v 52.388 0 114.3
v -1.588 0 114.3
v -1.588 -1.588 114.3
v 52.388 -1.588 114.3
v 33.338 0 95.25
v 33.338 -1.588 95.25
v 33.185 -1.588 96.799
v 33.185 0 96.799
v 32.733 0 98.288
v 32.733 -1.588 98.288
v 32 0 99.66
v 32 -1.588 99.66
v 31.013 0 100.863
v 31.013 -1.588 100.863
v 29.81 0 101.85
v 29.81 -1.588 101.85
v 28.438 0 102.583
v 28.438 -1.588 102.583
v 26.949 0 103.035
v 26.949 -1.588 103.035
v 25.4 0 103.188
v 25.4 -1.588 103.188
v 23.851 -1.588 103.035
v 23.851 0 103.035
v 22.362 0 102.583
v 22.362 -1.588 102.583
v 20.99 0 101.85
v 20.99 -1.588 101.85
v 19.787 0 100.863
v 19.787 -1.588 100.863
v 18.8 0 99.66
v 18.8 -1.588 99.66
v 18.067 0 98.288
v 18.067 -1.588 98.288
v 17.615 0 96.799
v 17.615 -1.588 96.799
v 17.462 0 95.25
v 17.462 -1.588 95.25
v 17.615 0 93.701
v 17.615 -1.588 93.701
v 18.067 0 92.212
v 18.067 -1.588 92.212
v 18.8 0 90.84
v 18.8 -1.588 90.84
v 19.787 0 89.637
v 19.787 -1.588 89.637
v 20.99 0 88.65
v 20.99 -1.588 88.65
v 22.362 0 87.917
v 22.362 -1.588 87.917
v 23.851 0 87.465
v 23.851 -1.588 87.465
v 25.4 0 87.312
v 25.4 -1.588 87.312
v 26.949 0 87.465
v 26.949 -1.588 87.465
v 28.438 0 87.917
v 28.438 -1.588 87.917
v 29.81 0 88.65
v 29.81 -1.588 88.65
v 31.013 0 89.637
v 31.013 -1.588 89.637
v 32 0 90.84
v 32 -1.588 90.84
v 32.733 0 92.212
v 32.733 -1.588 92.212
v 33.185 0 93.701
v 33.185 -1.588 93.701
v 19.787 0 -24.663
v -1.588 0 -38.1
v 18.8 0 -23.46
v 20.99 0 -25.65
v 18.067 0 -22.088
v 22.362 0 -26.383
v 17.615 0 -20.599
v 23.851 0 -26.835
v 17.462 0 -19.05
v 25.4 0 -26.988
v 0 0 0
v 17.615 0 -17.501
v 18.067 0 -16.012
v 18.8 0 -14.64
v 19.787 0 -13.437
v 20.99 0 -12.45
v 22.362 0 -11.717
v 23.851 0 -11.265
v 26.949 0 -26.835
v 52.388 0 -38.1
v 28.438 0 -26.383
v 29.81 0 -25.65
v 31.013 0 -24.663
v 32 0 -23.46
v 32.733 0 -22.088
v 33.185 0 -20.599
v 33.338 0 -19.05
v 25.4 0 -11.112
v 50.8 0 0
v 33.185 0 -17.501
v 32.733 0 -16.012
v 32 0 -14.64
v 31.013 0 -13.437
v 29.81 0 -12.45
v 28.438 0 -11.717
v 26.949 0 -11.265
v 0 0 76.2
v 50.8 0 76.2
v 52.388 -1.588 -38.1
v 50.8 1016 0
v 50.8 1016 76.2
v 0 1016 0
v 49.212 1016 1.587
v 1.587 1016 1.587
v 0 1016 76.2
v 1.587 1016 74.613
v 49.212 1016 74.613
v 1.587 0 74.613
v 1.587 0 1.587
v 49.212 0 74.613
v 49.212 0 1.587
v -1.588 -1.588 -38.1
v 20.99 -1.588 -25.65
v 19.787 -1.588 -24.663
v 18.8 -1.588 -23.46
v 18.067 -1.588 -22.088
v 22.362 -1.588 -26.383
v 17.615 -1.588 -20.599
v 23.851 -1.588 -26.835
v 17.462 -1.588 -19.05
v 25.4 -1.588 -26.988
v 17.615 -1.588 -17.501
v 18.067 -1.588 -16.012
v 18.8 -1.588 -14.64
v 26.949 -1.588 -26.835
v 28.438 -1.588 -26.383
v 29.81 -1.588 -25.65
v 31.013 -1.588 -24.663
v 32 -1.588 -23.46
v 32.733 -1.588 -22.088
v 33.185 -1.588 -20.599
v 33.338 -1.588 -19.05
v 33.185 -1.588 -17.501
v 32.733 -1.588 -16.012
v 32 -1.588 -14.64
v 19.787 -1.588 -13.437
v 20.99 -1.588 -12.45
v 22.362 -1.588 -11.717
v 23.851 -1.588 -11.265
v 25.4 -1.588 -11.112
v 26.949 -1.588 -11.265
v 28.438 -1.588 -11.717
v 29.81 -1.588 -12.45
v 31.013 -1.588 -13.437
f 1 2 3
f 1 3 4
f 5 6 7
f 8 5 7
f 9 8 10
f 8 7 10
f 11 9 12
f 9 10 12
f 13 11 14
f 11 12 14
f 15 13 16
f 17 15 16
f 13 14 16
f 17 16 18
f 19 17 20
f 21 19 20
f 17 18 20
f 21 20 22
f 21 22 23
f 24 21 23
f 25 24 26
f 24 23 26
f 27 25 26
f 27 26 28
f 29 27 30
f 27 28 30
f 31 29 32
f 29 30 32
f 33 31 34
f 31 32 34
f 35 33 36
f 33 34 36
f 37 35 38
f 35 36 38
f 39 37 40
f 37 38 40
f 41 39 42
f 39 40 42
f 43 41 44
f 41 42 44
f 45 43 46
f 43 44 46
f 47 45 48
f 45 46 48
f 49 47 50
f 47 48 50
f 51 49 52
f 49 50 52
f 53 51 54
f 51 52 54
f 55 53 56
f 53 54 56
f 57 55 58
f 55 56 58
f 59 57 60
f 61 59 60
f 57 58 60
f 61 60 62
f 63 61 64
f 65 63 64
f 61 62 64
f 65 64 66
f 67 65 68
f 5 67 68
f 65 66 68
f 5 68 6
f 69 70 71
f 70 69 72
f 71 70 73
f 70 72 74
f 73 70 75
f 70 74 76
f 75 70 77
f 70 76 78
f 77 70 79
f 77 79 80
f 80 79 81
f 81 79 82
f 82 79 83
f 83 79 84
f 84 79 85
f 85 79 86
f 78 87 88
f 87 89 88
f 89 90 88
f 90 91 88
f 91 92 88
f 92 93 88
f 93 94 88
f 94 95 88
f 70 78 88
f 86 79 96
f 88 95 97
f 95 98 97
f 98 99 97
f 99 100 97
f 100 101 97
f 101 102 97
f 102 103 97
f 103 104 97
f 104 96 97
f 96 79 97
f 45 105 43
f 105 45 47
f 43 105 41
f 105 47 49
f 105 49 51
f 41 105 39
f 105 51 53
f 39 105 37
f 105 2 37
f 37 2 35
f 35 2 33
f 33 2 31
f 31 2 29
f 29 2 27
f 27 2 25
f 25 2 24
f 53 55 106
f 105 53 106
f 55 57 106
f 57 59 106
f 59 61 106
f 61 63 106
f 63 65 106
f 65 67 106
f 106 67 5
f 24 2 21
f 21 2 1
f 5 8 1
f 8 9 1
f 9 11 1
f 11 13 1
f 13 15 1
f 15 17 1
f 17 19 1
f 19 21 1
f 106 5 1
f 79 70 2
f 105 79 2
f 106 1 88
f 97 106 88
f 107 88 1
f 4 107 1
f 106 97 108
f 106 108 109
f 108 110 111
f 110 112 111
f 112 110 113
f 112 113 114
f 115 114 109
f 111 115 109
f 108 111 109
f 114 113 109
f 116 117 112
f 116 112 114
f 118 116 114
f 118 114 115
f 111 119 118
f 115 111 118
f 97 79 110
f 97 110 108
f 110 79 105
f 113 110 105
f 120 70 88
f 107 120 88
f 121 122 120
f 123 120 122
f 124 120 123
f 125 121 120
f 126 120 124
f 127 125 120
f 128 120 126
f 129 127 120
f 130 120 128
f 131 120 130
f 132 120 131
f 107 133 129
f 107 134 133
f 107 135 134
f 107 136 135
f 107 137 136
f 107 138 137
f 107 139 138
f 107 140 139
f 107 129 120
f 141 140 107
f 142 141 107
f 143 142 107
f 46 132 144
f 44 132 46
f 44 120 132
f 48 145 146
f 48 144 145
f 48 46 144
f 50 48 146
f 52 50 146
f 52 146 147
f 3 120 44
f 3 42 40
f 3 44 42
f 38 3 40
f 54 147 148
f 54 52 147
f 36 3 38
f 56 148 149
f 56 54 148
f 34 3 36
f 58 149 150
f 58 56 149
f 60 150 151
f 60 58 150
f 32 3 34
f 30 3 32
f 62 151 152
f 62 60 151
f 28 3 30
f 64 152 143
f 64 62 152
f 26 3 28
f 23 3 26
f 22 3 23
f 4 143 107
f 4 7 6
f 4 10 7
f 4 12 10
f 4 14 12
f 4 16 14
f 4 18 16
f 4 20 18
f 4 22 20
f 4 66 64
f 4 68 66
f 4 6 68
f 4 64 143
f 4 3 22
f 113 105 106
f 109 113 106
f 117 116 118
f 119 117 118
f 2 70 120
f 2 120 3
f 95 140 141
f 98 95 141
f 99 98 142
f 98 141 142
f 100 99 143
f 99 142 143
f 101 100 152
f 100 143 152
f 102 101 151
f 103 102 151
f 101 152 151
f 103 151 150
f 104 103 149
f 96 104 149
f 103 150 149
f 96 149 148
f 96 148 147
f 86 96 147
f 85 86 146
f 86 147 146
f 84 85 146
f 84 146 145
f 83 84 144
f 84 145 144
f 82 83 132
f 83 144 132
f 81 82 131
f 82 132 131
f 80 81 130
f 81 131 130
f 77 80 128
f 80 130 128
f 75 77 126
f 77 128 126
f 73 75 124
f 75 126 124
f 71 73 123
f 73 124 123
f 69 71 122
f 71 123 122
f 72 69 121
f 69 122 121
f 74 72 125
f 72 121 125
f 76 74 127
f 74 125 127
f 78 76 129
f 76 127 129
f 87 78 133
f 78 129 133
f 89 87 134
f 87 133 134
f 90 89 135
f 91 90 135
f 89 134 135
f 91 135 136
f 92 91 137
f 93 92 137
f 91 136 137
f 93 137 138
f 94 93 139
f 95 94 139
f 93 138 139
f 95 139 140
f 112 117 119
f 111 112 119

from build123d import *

# Parameters (mm, degrees)
F0_W     = 50.8
F0_H     = 76.2
F0_W_2   = 47.625
F0_H_2   = 73.025
F1_DEPTH = 1016
F2_W     = 53.975
F2_H     = 152.4
F3_DEPTH = 1.5875
F4_R     = 7.9375
F5_DEPTH = 1.5875


with BuildPart() as f1:
    # F0 (on Front) → F1 (new body)
    with BuildSketch(Plane.XZ):
        with Locations((25.4, 38.1)):
            Rectangle(F0_W, F0_H)
        with Locations((25.4, 38.1)):
            Rectangle(F0_W_2, F0_H_2, mode=Mode.SUBTRACT)
    extrude(amount=-F1_DEPTH)

    # F2 (on face) → F3 (join)
    with BuildSketch(Plane.XZ):
        with Locations((25.4, 38.1)):
            Rectangle(F2_W, F2_H)
    extrude(amount=F3_DEPTH)

    # F4 (on face) → F5 (cut, through all)
    with BuildSketch(Plane.XZ.offset(1.5875)):
        with Locations((25.4, 95.25)):
            Circle(F4_R)
        with Locations((25.4, -19.05)):
            Circle(F4_R)
    extrude(amount=-F5_DEPTH, mode=Mode.SUBTRACT)


solid = f1.part
